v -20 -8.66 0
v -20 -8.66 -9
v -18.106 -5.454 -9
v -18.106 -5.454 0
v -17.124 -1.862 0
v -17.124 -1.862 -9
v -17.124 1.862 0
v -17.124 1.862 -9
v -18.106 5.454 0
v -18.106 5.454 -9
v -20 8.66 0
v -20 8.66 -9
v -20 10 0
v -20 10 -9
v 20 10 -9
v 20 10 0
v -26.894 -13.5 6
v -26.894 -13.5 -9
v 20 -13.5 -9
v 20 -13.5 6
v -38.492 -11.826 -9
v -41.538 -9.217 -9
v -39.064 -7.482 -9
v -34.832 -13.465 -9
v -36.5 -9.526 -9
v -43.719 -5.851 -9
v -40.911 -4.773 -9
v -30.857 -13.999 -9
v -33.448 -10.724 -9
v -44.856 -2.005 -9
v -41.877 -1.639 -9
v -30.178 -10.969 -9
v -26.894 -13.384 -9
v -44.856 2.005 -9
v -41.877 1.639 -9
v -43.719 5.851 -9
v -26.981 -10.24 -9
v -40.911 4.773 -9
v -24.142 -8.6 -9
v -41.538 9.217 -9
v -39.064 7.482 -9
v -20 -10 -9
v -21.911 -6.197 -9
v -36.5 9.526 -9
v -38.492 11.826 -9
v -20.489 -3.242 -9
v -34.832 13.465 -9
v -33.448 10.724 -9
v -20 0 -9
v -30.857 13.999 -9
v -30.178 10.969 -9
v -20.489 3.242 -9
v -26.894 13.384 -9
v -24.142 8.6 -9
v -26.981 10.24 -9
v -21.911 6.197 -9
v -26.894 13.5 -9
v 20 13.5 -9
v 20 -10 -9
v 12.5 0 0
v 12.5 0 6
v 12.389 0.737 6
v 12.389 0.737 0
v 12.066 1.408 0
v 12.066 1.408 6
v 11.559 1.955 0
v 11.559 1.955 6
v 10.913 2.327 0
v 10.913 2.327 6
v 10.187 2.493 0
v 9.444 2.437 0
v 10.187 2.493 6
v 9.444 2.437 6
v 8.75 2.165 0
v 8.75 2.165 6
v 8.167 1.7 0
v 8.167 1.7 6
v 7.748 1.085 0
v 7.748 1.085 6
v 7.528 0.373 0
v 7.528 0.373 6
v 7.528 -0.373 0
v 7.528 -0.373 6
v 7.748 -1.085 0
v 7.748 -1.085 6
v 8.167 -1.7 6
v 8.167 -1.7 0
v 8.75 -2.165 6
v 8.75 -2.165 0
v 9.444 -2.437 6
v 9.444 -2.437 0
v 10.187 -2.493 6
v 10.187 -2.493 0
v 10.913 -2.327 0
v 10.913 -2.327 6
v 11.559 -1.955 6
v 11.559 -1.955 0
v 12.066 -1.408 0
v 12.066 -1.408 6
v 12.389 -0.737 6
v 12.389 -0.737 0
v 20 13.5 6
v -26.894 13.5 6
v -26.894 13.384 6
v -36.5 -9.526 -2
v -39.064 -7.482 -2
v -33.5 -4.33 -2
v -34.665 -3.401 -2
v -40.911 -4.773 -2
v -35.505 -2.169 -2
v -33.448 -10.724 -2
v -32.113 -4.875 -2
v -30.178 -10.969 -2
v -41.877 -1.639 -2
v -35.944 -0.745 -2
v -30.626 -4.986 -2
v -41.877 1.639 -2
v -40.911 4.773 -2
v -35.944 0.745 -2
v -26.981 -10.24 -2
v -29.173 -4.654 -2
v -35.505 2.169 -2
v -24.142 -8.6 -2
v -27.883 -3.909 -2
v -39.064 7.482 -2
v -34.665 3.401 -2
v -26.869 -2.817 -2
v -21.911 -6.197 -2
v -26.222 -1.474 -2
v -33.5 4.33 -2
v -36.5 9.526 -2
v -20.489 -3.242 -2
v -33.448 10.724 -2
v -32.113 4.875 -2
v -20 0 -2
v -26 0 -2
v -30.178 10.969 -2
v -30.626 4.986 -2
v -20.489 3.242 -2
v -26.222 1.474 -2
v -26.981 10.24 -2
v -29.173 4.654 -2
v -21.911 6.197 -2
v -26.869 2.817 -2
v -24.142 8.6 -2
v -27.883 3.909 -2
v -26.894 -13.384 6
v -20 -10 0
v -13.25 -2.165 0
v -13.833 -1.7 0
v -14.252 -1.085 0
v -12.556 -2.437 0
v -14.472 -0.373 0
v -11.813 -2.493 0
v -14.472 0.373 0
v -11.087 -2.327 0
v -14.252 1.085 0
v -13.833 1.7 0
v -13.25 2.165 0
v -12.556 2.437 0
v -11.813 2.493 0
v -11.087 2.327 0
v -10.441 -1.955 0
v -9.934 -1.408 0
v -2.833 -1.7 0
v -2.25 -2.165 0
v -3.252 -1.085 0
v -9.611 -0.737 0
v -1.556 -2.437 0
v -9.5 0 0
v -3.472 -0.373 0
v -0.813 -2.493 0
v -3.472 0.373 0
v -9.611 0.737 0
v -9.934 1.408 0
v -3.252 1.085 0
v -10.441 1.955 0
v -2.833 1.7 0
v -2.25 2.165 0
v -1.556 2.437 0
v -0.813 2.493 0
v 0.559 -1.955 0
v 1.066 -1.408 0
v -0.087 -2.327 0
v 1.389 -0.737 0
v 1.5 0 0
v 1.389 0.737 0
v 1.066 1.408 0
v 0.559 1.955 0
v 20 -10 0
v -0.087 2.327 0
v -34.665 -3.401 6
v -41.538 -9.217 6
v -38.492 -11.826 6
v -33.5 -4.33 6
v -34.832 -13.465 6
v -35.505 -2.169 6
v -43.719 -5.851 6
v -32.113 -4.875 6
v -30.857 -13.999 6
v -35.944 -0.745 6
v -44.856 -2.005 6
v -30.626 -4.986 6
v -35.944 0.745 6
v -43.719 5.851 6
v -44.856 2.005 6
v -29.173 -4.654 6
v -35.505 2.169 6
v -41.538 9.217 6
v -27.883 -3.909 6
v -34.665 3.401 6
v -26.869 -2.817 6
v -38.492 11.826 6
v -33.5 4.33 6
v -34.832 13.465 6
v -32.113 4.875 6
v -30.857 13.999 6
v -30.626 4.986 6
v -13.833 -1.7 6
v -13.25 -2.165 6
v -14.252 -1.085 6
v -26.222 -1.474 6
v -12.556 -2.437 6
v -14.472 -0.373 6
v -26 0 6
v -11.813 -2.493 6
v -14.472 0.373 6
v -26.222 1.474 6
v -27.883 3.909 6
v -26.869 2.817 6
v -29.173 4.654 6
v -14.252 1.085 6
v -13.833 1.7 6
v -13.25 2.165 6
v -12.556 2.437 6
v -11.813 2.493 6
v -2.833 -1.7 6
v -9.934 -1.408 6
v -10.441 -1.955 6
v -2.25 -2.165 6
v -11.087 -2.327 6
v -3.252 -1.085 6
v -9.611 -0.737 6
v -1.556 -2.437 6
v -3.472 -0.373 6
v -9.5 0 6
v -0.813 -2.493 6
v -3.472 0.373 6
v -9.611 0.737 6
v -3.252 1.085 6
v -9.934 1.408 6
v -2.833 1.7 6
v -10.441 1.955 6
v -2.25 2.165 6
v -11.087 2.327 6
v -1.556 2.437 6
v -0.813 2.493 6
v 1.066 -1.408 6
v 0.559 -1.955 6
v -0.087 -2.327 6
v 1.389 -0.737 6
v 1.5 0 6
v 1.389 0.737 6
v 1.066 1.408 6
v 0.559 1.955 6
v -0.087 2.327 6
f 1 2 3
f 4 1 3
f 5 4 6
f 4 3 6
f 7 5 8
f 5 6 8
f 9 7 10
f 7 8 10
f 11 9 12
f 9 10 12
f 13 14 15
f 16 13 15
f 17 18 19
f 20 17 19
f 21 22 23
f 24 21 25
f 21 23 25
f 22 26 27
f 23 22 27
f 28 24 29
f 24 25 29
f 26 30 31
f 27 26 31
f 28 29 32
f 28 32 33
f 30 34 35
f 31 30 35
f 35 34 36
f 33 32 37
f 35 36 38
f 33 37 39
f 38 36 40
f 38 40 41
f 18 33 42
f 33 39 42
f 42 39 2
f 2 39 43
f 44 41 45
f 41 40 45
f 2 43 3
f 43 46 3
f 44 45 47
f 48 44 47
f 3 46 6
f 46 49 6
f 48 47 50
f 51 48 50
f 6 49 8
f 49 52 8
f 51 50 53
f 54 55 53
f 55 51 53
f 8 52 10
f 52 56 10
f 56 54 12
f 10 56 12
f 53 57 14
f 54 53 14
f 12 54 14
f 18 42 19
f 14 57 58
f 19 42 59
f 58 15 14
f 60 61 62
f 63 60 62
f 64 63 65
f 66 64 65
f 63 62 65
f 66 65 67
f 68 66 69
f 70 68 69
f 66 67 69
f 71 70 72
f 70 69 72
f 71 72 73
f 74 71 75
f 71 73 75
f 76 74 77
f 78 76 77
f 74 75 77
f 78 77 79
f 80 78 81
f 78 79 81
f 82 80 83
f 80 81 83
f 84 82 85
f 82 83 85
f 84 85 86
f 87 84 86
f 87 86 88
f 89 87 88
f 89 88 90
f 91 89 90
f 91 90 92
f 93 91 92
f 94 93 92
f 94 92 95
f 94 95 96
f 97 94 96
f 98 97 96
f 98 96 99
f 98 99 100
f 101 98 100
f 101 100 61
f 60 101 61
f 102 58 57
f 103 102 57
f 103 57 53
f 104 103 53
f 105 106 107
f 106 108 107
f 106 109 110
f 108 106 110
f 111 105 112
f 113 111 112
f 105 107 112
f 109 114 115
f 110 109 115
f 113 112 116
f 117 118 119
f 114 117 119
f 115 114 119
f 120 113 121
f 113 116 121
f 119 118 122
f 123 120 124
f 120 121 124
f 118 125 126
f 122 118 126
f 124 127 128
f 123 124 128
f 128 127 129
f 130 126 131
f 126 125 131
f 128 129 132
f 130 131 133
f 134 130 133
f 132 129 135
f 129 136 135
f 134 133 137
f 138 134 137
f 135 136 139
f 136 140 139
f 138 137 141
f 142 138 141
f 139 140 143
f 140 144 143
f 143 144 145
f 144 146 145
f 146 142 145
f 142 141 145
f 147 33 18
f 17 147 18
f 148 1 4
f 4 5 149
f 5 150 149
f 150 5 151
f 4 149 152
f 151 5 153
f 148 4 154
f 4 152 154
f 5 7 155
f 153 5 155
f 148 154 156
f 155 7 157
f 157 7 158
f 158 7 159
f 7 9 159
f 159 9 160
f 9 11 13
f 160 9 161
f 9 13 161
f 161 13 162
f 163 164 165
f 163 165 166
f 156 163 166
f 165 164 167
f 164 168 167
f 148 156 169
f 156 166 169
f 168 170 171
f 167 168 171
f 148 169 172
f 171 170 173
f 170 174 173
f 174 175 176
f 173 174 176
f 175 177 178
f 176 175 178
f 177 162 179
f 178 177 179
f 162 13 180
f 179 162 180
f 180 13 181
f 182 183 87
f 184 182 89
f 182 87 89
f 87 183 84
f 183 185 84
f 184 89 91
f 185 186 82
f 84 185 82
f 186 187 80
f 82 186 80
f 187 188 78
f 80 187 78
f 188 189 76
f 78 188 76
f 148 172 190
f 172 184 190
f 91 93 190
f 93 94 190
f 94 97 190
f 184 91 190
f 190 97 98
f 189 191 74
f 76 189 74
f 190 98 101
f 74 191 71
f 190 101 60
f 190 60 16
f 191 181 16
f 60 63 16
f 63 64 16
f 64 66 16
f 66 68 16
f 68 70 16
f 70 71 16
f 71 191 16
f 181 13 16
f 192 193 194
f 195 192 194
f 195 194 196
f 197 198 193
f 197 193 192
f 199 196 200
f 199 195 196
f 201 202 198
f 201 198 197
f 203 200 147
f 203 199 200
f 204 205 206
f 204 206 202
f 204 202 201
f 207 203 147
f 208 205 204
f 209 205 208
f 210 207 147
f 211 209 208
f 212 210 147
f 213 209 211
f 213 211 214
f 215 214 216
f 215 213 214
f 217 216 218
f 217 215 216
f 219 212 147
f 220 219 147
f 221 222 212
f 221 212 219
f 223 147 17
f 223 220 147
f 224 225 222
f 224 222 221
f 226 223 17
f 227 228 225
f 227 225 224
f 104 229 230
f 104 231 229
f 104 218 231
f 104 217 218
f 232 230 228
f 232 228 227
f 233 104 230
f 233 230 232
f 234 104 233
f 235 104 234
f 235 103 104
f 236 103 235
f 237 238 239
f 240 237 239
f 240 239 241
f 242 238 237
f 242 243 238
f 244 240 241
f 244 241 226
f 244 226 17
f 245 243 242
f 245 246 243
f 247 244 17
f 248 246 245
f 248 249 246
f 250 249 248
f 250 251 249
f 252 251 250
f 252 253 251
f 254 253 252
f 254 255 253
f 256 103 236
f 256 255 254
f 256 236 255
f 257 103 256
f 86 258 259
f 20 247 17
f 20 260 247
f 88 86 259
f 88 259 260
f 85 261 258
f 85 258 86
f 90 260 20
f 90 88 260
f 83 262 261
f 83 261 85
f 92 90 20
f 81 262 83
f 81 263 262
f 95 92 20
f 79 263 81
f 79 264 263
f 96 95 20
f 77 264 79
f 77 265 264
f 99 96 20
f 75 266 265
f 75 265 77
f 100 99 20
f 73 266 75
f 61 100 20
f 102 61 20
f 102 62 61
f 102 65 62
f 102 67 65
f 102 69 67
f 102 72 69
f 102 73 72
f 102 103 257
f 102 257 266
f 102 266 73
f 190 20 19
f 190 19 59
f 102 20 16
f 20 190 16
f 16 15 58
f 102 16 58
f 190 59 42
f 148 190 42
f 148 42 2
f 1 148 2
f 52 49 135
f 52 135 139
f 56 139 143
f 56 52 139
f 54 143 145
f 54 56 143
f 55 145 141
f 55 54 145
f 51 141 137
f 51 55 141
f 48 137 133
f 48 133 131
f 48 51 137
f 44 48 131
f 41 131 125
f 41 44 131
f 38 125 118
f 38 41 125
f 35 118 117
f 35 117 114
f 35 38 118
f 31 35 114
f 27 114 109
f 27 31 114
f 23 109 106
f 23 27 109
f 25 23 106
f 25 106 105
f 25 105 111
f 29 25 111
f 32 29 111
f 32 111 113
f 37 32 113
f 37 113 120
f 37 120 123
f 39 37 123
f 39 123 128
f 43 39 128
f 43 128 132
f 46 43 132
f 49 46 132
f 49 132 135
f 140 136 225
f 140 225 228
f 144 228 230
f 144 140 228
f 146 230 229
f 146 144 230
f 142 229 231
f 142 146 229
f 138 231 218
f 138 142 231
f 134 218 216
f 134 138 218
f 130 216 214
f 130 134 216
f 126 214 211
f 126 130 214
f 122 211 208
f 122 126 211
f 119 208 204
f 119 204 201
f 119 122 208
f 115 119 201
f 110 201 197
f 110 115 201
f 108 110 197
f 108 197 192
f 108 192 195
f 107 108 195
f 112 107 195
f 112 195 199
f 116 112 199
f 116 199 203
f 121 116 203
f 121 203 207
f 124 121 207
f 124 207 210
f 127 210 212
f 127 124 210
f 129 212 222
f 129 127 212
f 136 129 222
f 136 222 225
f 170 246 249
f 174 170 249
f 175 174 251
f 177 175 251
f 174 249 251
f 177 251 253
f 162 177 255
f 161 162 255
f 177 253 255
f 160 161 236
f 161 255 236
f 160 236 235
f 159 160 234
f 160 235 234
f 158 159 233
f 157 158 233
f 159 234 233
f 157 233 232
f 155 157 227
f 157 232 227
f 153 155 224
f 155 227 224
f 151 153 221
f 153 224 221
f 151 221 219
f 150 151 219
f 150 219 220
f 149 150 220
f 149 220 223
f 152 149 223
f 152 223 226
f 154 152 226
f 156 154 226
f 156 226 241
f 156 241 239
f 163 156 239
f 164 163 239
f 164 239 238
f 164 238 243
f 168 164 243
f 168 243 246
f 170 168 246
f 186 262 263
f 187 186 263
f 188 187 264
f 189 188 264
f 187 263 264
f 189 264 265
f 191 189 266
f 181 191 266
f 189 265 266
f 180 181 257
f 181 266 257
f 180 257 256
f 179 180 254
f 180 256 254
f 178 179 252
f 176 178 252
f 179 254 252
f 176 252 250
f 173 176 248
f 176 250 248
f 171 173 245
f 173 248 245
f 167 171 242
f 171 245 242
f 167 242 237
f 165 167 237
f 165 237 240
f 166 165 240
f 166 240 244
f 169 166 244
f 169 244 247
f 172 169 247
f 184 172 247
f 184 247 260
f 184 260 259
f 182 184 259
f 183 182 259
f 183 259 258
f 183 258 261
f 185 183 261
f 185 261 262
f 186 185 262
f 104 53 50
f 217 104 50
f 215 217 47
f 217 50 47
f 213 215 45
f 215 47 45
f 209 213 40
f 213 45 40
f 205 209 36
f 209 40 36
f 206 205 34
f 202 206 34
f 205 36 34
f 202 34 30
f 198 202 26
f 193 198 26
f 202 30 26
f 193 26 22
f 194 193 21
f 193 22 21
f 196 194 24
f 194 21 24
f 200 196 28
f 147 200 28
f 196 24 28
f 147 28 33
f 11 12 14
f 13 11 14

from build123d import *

# Parameters (mm, degrees)
SKETCH_1_W          = 40
SKETCH_1_H          = 20
EXTRUDE_1_DEPTH     = 6
SKETCH_2_R          = 2.5
CUT_EXTRUDE_1_DEPTH = 24.151673806
SKETCH_3_R          = 11
EXTRUDE_2_DEPTH     = 15
SKETCH_6_R          = 11
SKETCH_6_R_2        = 5
EXTRUDE_3_DEPTH     = 8


with BuildPart() as part:
    # 草图1 → 凸台-拉伸1 (new body)
    with BuildSketch(Plane.XY):
        Rectangle(SKETCH_1_W, SKETCH_1_H)
    extrude(amount=EXTRUDE_1_DEPTH)

    # 草图2 → 切除-拉伸1 (cut, through all)
    with BuildSketch(Plane.XY.offset(6)):
        with Locations((10, 0)):
            Circle(SKETCH_2_R)
        with Locations((-1, 0)):
            Circle(SKETCH_2_R)
        with Locations((-12, 0)):
            Circle(SKETCH_2_R)
    extrude(amount=-CUT_EXTRUDE_1_DEPTH, mode=Mode.SUBTRACT)

    # 草图3 → 凸台-拉伸2 (add)
    with BuildSketch(Plane.XY.offset(6)):
        with BuildLine():
            Line((20, 10), (20, 13.5))
            Line((20, 13.5), (-26.893967141, 13.5))
            Line((-26.893967141, 13.5), (-26.893967141, 13.384337644))
            ThreePointArc((-26.893967141, 13.384337644), (-45, 0), (-26.893967141, -13.384337644))
            Line((-26.893967141, -13.384337644), (-26.893967141, -13.5))
            Line((-26.893967141, -13.5), (20, -13.5))
            Line((20, -13.5), (20, -10))
            Line((20, -10), (-20, -10))
            Line((-20, -10), (-20, -8.660254038))
            ThreePointArc((-20, -8.660254038), (-17, 0), (-20, 8.660254038))
            Line((-20, 8.660254038), (-20, 10))
            Line((-20, 10), (20, 10))
        make_face()
        with Locations((-31, 0)):
            Circle(SKETCH_3_R, mode=Mode.SUBTRACT)
    extrude(amount=-EXTRUDE_2_DEPTH)

    # 草图6 → 凸台-拉伸3 (add)
    with BuildSketch(Plane.XY.offset(6)):
        with Locations((-31, 0)):
            Circle(SKETCH_6_R)
        with Locations((-31, 0)):
            Circle(SKETCH_6_R_2, mode=Mode.SUBTRACT)
    extrude(amount=-EXTRUDE_3_DEPTH)


solid = part.part
